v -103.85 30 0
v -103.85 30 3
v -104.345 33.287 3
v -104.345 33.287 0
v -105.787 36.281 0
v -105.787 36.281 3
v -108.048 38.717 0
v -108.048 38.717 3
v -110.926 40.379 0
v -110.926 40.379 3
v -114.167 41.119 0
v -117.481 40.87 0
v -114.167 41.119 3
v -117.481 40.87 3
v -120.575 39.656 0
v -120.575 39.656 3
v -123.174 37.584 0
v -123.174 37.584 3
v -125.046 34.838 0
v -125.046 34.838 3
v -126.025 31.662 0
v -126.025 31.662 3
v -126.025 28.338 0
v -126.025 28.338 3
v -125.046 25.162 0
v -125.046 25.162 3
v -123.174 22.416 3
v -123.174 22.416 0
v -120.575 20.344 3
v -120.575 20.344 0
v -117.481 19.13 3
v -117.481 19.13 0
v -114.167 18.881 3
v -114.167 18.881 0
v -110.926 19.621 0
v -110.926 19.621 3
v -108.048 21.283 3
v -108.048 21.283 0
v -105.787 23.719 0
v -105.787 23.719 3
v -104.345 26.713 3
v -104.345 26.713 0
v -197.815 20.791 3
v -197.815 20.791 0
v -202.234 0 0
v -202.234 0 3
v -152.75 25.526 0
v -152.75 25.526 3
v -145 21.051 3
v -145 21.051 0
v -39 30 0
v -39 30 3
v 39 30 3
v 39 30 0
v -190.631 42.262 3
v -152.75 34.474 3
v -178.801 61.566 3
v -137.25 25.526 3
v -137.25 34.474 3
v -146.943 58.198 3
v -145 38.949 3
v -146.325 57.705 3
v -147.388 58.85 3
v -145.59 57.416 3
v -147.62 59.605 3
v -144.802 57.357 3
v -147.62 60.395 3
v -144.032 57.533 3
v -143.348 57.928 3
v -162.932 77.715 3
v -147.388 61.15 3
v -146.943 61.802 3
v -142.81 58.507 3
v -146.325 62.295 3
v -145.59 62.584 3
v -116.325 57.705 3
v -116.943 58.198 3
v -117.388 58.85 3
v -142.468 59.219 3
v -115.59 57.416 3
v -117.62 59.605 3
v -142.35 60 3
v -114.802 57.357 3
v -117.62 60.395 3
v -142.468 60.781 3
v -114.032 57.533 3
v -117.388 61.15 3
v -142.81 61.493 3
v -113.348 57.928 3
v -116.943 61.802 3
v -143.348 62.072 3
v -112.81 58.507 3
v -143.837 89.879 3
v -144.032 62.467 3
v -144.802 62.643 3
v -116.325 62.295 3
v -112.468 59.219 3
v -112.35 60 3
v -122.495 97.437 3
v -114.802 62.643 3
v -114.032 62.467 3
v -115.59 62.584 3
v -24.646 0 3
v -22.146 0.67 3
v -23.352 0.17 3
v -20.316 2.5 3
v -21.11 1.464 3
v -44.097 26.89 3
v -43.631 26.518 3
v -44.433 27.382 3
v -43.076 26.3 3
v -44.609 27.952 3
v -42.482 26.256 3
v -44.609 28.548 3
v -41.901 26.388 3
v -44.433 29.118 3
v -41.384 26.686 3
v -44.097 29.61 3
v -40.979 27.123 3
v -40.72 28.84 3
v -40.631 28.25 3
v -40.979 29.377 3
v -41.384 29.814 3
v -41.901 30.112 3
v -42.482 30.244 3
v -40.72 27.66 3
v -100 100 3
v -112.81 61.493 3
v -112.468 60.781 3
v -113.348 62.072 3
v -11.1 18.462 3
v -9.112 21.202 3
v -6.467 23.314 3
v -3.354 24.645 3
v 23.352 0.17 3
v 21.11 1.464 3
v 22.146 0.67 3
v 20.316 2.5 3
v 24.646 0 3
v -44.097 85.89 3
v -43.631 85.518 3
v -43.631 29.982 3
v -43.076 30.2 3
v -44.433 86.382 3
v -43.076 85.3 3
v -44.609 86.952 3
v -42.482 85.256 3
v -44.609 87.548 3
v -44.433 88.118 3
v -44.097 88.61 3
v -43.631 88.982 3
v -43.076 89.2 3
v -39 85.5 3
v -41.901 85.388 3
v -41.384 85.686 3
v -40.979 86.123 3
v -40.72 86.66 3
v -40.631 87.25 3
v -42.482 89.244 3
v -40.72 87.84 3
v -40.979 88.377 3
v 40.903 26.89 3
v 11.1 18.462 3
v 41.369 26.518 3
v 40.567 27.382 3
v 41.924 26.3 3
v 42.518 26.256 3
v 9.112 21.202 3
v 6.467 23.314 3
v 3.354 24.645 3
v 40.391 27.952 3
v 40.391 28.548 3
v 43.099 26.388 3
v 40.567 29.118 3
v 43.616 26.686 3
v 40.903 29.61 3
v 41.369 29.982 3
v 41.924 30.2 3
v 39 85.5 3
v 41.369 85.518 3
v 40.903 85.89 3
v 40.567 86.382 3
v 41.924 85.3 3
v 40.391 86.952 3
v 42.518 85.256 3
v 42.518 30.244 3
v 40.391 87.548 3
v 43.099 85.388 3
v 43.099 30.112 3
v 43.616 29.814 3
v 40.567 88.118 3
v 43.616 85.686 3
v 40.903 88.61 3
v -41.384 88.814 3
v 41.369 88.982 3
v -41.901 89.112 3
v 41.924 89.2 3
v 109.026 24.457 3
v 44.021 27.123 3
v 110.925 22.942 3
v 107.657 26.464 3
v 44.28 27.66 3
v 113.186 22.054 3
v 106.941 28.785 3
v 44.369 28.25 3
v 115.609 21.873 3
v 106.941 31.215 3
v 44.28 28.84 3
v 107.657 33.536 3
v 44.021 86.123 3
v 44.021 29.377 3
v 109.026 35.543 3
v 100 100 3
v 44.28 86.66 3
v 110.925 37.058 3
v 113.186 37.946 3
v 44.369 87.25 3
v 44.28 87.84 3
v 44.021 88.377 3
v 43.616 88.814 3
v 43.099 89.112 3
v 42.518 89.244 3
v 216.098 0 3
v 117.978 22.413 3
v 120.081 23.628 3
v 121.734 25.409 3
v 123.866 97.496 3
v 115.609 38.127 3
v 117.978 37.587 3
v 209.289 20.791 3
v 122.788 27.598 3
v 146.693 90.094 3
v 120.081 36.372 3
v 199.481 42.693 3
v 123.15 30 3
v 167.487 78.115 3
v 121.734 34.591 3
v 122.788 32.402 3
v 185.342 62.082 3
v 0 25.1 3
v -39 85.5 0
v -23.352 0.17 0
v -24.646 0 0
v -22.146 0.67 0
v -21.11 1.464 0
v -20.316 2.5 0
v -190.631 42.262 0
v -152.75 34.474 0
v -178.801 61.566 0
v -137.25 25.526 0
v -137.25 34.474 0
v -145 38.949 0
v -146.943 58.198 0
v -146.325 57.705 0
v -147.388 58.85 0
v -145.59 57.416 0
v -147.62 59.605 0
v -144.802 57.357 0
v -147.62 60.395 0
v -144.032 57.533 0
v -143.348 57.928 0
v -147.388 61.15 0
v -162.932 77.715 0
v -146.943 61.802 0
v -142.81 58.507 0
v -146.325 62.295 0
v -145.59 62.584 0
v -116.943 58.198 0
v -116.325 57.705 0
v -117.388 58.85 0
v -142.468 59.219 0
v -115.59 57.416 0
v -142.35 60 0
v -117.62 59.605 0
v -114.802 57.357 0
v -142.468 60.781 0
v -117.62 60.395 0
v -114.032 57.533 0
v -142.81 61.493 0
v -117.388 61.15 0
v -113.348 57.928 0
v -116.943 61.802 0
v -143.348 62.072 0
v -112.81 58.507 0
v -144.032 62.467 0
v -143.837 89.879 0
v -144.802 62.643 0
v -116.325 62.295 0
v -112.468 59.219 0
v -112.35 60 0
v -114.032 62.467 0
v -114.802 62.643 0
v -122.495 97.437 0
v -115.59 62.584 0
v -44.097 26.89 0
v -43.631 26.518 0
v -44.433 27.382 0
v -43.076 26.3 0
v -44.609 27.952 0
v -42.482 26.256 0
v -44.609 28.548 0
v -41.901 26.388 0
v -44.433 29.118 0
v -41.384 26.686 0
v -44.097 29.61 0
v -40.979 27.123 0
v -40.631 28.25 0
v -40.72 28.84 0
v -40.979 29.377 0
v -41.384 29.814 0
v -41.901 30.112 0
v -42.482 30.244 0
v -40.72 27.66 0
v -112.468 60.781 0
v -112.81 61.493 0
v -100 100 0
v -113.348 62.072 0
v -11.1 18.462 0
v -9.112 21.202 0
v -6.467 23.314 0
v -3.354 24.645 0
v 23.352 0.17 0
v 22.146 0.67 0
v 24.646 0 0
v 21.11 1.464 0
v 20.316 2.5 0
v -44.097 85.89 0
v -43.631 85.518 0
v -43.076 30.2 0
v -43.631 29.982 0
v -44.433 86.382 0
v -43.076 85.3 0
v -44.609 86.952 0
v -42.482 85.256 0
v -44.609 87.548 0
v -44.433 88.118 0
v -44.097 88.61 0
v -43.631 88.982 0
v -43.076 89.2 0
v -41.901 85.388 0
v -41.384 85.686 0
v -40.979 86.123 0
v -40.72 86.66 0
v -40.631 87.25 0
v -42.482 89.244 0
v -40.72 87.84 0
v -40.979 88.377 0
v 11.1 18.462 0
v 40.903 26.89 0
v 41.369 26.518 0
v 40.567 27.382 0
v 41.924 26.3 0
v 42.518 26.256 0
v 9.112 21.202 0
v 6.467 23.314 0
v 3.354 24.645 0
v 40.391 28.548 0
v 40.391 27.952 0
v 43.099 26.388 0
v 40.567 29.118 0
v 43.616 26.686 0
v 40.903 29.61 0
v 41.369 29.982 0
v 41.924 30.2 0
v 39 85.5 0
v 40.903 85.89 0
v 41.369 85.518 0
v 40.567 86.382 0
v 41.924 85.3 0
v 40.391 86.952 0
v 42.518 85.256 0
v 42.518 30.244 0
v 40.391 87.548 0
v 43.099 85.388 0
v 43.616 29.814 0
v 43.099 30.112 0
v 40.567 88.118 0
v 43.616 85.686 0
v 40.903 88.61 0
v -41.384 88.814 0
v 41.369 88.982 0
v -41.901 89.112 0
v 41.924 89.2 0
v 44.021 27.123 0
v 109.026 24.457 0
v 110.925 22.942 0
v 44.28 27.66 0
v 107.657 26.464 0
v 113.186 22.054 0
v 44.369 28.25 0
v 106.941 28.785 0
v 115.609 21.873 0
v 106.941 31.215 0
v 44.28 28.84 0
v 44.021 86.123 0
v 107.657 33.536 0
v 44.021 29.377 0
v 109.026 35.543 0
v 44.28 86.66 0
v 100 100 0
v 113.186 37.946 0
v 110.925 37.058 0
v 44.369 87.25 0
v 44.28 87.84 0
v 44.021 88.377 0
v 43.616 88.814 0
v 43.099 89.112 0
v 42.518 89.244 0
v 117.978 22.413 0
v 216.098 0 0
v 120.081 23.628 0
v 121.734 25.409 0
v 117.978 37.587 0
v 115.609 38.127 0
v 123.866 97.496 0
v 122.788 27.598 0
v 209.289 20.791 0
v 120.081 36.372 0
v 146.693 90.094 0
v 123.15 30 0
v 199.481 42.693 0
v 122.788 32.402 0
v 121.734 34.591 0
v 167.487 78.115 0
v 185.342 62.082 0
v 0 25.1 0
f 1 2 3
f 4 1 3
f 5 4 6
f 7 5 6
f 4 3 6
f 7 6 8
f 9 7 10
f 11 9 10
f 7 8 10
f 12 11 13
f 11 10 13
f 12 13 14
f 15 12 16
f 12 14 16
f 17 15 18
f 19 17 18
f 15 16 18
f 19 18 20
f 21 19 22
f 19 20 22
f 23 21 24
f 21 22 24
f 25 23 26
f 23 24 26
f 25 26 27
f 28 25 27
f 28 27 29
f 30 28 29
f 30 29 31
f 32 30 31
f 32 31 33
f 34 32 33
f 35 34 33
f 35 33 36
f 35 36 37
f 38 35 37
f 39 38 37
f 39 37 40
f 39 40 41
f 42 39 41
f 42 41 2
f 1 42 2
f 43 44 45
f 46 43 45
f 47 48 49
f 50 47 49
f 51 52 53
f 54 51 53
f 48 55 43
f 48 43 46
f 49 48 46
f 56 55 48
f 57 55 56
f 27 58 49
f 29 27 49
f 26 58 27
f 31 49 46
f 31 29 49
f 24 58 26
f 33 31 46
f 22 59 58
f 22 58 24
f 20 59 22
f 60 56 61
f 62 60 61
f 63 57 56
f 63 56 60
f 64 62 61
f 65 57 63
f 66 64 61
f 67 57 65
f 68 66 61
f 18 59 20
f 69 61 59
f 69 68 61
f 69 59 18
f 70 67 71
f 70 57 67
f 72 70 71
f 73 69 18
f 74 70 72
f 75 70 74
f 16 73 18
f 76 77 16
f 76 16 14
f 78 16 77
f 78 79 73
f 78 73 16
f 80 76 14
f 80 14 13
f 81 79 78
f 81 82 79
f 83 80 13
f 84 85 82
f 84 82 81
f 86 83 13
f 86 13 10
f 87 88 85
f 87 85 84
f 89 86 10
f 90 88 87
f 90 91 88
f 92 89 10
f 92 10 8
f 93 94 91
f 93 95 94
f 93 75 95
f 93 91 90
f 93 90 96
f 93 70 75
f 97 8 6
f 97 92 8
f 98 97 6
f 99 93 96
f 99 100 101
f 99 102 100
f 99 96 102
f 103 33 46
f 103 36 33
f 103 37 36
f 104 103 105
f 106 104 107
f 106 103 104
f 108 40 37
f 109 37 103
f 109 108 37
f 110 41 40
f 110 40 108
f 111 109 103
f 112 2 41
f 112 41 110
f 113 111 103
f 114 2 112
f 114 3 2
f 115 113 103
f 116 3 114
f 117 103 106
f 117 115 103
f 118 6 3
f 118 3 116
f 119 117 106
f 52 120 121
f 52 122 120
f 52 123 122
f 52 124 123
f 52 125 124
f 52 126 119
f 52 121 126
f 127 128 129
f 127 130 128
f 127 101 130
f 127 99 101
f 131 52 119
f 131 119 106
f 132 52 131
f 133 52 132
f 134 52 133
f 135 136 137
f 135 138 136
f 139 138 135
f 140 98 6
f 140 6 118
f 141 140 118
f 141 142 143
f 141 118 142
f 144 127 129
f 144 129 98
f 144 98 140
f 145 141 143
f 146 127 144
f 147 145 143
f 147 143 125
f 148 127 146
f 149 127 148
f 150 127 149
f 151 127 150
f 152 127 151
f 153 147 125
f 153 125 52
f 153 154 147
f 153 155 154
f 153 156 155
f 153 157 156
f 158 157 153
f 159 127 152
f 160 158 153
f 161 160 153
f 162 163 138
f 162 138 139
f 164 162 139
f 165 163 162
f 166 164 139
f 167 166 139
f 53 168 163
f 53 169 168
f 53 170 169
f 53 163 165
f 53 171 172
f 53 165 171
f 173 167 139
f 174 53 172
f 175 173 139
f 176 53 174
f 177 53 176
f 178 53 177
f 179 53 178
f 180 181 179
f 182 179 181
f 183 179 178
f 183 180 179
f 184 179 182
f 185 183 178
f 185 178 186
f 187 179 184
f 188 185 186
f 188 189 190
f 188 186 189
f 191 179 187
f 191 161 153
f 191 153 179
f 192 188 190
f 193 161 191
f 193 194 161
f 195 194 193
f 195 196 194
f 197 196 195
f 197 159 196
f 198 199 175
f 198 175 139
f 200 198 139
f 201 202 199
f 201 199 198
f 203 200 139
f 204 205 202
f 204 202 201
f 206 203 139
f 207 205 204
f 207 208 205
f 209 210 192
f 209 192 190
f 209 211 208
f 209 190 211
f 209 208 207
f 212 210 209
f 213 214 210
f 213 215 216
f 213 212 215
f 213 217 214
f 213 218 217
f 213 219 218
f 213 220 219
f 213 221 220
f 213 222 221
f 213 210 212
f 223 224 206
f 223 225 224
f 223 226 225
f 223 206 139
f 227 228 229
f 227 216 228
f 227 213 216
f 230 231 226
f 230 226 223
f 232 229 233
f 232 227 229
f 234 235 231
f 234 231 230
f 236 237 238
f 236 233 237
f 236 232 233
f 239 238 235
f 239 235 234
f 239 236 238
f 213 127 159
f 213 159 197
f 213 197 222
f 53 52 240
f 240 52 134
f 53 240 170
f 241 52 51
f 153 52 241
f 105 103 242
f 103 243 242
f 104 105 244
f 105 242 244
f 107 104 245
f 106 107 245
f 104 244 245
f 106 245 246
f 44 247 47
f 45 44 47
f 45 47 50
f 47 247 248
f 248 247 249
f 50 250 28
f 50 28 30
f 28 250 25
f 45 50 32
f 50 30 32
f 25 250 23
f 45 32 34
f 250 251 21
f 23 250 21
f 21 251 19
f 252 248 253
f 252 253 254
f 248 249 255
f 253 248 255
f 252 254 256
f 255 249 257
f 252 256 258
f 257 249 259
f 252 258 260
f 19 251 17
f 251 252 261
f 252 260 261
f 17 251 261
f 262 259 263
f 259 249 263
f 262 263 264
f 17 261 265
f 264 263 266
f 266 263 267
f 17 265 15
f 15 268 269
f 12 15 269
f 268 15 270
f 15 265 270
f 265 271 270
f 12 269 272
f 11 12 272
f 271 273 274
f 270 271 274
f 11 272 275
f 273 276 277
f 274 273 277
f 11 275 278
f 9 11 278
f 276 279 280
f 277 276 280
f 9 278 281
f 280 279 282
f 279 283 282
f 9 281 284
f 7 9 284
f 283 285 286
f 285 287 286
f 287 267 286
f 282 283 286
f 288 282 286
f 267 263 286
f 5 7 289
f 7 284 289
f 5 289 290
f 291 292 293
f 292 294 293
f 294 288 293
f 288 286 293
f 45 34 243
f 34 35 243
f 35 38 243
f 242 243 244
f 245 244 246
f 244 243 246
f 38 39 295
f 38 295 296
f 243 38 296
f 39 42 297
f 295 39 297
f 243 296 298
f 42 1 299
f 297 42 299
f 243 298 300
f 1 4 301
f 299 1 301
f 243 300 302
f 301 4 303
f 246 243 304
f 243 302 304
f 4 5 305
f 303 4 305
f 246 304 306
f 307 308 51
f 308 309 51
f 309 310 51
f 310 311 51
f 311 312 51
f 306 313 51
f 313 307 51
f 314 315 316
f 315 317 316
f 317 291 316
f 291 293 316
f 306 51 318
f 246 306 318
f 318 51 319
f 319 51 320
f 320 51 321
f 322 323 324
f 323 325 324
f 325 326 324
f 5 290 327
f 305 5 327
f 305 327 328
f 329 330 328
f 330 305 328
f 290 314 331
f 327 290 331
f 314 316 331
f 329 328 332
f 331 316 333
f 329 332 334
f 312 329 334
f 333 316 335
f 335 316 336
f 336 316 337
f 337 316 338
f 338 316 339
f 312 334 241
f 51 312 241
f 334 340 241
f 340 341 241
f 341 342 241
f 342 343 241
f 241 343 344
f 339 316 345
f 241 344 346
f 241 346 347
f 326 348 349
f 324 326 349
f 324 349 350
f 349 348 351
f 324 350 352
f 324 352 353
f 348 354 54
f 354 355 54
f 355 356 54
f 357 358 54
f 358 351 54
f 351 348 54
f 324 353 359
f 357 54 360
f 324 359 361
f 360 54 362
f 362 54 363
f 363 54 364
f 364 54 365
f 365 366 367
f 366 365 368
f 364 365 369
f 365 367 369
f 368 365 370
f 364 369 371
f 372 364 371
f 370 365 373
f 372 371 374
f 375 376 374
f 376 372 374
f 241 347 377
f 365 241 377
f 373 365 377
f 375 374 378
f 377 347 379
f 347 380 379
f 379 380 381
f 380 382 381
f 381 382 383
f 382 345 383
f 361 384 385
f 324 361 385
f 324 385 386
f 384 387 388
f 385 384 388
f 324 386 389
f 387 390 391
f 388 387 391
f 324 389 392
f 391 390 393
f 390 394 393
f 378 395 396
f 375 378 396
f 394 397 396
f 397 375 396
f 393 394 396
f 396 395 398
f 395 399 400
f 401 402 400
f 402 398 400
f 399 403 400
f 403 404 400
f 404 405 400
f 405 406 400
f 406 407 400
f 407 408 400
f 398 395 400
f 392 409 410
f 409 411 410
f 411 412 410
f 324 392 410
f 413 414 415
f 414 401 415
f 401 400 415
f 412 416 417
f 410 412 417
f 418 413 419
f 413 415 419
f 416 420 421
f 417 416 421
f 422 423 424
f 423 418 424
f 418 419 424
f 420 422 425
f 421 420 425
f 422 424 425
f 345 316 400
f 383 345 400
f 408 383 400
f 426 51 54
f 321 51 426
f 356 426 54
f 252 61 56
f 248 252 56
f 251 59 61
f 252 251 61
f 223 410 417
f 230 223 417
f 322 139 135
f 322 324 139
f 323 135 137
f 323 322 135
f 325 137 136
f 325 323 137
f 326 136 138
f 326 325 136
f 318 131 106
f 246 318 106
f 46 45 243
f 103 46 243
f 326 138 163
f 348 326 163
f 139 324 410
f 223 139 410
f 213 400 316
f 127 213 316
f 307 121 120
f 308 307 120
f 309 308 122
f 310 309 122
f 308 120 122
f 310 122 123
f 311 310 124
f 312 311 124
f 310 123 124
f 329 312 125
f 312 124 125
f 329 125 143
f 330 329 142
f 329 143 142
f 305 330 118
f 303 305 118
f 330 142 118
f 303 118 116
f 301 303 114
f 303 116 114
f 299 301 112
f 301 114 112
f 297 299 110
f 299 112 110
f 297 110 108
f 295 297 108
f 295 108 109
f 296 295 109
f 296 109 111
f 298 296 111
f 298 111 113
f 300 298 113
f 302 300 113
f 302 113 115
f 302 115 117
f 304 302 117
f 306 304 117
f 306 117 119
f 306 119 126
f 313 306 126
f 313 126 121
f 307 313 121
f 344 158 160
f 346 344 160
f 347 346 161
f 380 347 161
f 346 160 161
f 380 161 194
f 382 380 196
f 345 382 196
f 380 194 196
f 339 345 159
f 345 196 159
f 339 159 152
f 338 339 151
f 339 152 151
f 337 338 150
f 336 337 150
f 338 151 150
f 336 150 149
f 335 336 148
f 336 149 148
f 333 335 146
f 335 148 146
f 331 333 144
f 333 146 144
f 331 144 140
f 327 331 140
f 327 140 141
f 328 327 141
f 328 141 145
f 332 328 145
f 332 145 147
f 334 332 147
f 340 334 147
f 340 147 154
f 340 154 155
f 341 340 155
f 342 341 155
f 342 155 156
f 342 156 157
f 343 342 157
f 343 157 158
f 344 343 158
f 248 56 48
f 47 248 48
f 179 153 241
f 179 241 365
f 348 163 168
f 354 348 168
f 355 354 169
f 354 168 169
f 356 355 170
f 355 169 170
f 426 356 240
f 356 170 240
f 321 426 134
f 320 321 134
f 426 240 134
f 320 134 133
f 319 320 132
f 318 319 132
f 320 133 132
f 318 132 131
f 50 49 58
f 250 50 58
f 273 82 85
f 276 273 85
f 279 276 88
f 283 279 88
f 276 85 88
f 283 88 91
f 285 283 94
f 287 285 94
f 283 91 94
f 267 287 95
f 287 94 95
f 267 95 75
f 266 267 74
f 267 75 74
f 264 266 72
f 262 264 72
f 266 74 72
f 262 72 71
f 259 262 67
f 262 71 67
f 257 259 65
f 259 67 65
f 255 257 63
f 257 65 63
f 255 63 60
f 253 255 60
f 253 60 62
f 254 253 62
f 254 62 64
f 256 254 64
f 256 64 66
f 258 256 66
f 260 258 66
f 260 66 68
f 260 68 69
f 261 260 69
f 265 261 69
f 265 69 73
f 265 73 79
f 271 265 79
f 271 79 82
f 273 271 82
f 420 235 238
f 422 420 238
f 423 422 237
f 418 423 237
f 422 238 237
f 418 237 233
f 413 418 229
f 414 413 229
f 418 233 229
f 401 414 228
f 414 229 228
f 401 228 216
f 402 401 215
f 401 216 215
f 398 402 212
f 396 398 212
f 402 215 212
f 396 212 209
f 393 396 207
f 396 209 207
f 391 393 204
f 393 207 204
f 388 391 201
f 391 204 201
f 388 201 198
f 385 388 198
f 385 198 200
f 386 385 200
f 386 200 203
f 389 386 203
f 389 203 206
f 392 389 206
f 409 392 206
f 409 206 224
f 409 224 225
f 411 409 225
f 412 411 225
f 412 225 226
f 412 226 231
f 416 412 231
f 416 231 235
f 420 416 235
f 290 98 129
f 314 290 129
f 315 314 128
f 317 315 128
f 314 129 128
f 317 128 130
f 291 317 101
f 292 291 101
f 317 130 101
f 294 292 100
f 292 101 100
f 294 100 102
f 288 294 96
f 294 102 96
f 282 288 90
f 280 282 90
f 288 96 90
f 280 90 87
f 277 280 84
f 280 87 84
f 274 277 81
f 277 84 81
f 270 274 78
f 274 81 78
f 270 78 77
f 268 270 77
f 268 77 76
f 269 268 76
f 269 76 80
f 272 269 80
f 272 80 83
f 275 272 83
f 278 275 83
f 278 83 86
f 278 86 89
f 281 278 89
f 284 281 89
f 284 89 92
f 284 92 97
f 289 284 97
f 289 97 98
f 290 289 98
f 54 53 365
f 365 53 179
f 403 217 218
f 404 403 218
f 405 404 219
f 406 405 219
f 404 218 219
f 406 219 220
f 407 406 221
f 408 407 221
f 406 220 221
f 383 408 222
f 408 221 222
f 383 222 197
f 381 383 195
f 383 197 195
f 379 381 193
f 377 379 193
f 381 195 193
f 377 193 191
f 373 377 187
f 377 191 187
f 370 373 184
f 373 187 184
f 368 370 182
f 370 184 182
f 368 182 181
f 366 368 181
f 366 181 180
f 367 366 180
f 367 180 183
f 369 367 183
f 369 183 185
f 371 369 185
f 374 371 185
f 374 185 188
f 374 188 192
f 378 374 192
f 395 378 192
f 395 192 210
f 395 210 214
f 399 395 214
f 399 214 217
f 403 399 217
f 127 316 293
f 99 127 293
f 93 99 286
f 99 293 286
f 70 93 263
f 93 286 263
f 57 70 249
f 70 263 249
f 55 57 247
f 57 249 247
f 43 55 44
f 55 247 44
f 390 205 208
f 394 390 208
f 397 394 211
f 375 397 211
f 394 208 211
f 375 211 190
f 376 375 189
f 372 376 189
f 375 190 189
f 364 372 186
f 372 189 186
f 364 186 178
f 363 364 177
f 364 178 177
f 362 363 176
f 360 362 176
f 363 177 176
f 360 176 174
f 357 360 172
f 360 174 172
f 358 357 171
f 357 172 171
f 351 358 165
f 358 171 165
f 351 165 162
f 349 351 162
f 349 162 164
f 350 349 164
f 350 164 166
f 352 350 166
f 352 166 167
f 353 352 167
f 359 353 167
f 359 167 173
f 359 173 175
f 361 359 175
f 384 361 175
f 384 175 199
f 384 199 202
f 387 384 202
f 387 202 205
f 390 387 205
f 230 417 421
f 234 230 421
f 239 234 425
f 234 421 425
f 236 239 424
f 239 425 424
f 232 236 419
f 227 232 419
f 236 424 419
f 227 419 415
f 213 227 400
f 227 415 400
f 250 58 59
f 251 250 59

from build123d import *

# Parameters (mm, degrees)
F1_DEPTH  = 3
F3_DEPTH  = 25
F4_R      = 5
F5_R      = 11.15
F5_R_2    = 2.65
F6_DEPTH  = 25
F7_W      = 78
F7_H      = 55.5
F7_R      = 2
F8_DEPTH  = 25
F9_R      = 8.15
F10_DEPTH = 25


with BuildPart() as f1:
    # F0 (on Top) → F1 (new body)
    with BuildSketch(Plane.XY):
        with BuildLine():
            Line((-197.8147600734, 20.7911690818), (-202.2340594865, 0))
            Line((-202.2340594865, 0), (216.0975214603, 0))
            Line((216.0975214603, 0), (209.2885731253, 20.7911690818))
            ThreePointArc((209.2885731253, 20.7911690818), (167.4870934164, 78.1154778874), (100, 100))
            Line((100, 100), (-100, 100))
            ThreePointArc((-100, 100), (-162.932039105, 77.7145961457), (-197.8147600734, 20.7911690818))
        make_face()
    extrude(amount=F1_DEPTH)

    # F2 (on face) → F3 (cut)
    with BuildSketch(Plane.XY.offset(3)):
        with BuildLine():
            ThreePointArc((1.5842979518, 0), (9.4530988092, 4.1693984068), (12.6, 12.5))
            ThreePointArc((12.6, 12.5), (12.2192388124, 15.5741182224), (11.0999678023, 18.4624420155))
            ThreePointArc((11.0999678023, 18.4624420155), (0, 25.1), (-11.0999678023, 18.4624420155))
            ThreePointArc((-11.0999678023, 18.4624420155), (-11.1999147641, 6.7274867453), (-1.5842979518, 0))
            Line((-1.5842979518, 0), (1.5842979518, 0))
        make_face()
        with BuildLine():
            ThreePointArc((11.0999678023, 18.4624420155), (12.2192388124, 15.5741182224), (12.6, 12.5))
            ThreePointArc((12.6, 12.5), (9.4530988092, 4.1693984068), (1.5842979518, 0))
            Line((1.5842979518, 0), (21.7592636698, 0))
            Line((21.7592636698, 0), (11.0999678023, 18.4624420155))
        make_face()
        with BuildLine():
            ThreePointArc((-1.5842979518, 0), (0, -0.1), (1.5842979518, 0))
            Line((1.5842979518, 0), (-1.5842979518, 0))
        make_face()
        with BuildLine():
            ThreePointArc((-1.5842979518, 0), (-11.1999147641, 6.7274867453), (-11.0999678023, 18.4624420155))
            Line((-11.0999678023, 18.4624420155), (-21.7592636698, 0))
            Line((-21.7592636698, 0), (-1.5842979518, 0))
        make_face()
    extrude(amount=-F3_DEPTH, mode=Mode.SUBTRACT)

    # F4
    f4_edges = [f1.edges().sort_by_distance(p)[0] for p in [
        (-21.759264, 0, 1.5),
        (21.759264, 0, 1.5),
    ]]
    fillet(f4_edges, radius=F4_R)

    # F5 (on face) → F6 (cut)
    with BuildSketch(Plane.XY.offset(3)):
        Polygon((-145, 38.9489291724), (-152.75, 34.4744645862), (-152.75, 25.5255354138), (-145, 21.0510708276), (-137.25, 25.5255354138), (-137.25, 34.4744645862), align=None)
        with Locations((-115, 30)):
            Circle(F5_R)
        with Locations((-115, 60)):
            Circle(F5_R_2)
        with Locations((-145, 60)):
            Circle(F5_R_2)
    extrude(amount=-F6_DEPTH, mode=Mode.SUBTRACT)

    # F7 (on face) → F8 (cut)
    with BuildSketch(Plane.XY.offset(3)):
        with Locations((0, 57.75)):
            Rectangle(F7_W, F7_H)
        with Locations((-42.6313167033, 28.25)):
            Circle(F7_R)
        with Locations((-42.6313167033, 87.25)):
            Circle(F7_R)
        with Locations((42.3686832967, 87.25)):
            Circle(F7_R)
        with Locations((42.3686832967, 28.25)):
            Circle(F7_R)
    extrude(amount=-F8_DEPTH, mode=Mode.SUBTRACT)

    # F9 (on face) → F10 (cut)
    with BuildSketch(Plane.XY.offset(3)):
        with Locations((115, 30)):
            Circle(F9_R)
    extrude(amount=-F10_DEPTH, mode=Mode.SUBTRACT)


solid = f1.part
